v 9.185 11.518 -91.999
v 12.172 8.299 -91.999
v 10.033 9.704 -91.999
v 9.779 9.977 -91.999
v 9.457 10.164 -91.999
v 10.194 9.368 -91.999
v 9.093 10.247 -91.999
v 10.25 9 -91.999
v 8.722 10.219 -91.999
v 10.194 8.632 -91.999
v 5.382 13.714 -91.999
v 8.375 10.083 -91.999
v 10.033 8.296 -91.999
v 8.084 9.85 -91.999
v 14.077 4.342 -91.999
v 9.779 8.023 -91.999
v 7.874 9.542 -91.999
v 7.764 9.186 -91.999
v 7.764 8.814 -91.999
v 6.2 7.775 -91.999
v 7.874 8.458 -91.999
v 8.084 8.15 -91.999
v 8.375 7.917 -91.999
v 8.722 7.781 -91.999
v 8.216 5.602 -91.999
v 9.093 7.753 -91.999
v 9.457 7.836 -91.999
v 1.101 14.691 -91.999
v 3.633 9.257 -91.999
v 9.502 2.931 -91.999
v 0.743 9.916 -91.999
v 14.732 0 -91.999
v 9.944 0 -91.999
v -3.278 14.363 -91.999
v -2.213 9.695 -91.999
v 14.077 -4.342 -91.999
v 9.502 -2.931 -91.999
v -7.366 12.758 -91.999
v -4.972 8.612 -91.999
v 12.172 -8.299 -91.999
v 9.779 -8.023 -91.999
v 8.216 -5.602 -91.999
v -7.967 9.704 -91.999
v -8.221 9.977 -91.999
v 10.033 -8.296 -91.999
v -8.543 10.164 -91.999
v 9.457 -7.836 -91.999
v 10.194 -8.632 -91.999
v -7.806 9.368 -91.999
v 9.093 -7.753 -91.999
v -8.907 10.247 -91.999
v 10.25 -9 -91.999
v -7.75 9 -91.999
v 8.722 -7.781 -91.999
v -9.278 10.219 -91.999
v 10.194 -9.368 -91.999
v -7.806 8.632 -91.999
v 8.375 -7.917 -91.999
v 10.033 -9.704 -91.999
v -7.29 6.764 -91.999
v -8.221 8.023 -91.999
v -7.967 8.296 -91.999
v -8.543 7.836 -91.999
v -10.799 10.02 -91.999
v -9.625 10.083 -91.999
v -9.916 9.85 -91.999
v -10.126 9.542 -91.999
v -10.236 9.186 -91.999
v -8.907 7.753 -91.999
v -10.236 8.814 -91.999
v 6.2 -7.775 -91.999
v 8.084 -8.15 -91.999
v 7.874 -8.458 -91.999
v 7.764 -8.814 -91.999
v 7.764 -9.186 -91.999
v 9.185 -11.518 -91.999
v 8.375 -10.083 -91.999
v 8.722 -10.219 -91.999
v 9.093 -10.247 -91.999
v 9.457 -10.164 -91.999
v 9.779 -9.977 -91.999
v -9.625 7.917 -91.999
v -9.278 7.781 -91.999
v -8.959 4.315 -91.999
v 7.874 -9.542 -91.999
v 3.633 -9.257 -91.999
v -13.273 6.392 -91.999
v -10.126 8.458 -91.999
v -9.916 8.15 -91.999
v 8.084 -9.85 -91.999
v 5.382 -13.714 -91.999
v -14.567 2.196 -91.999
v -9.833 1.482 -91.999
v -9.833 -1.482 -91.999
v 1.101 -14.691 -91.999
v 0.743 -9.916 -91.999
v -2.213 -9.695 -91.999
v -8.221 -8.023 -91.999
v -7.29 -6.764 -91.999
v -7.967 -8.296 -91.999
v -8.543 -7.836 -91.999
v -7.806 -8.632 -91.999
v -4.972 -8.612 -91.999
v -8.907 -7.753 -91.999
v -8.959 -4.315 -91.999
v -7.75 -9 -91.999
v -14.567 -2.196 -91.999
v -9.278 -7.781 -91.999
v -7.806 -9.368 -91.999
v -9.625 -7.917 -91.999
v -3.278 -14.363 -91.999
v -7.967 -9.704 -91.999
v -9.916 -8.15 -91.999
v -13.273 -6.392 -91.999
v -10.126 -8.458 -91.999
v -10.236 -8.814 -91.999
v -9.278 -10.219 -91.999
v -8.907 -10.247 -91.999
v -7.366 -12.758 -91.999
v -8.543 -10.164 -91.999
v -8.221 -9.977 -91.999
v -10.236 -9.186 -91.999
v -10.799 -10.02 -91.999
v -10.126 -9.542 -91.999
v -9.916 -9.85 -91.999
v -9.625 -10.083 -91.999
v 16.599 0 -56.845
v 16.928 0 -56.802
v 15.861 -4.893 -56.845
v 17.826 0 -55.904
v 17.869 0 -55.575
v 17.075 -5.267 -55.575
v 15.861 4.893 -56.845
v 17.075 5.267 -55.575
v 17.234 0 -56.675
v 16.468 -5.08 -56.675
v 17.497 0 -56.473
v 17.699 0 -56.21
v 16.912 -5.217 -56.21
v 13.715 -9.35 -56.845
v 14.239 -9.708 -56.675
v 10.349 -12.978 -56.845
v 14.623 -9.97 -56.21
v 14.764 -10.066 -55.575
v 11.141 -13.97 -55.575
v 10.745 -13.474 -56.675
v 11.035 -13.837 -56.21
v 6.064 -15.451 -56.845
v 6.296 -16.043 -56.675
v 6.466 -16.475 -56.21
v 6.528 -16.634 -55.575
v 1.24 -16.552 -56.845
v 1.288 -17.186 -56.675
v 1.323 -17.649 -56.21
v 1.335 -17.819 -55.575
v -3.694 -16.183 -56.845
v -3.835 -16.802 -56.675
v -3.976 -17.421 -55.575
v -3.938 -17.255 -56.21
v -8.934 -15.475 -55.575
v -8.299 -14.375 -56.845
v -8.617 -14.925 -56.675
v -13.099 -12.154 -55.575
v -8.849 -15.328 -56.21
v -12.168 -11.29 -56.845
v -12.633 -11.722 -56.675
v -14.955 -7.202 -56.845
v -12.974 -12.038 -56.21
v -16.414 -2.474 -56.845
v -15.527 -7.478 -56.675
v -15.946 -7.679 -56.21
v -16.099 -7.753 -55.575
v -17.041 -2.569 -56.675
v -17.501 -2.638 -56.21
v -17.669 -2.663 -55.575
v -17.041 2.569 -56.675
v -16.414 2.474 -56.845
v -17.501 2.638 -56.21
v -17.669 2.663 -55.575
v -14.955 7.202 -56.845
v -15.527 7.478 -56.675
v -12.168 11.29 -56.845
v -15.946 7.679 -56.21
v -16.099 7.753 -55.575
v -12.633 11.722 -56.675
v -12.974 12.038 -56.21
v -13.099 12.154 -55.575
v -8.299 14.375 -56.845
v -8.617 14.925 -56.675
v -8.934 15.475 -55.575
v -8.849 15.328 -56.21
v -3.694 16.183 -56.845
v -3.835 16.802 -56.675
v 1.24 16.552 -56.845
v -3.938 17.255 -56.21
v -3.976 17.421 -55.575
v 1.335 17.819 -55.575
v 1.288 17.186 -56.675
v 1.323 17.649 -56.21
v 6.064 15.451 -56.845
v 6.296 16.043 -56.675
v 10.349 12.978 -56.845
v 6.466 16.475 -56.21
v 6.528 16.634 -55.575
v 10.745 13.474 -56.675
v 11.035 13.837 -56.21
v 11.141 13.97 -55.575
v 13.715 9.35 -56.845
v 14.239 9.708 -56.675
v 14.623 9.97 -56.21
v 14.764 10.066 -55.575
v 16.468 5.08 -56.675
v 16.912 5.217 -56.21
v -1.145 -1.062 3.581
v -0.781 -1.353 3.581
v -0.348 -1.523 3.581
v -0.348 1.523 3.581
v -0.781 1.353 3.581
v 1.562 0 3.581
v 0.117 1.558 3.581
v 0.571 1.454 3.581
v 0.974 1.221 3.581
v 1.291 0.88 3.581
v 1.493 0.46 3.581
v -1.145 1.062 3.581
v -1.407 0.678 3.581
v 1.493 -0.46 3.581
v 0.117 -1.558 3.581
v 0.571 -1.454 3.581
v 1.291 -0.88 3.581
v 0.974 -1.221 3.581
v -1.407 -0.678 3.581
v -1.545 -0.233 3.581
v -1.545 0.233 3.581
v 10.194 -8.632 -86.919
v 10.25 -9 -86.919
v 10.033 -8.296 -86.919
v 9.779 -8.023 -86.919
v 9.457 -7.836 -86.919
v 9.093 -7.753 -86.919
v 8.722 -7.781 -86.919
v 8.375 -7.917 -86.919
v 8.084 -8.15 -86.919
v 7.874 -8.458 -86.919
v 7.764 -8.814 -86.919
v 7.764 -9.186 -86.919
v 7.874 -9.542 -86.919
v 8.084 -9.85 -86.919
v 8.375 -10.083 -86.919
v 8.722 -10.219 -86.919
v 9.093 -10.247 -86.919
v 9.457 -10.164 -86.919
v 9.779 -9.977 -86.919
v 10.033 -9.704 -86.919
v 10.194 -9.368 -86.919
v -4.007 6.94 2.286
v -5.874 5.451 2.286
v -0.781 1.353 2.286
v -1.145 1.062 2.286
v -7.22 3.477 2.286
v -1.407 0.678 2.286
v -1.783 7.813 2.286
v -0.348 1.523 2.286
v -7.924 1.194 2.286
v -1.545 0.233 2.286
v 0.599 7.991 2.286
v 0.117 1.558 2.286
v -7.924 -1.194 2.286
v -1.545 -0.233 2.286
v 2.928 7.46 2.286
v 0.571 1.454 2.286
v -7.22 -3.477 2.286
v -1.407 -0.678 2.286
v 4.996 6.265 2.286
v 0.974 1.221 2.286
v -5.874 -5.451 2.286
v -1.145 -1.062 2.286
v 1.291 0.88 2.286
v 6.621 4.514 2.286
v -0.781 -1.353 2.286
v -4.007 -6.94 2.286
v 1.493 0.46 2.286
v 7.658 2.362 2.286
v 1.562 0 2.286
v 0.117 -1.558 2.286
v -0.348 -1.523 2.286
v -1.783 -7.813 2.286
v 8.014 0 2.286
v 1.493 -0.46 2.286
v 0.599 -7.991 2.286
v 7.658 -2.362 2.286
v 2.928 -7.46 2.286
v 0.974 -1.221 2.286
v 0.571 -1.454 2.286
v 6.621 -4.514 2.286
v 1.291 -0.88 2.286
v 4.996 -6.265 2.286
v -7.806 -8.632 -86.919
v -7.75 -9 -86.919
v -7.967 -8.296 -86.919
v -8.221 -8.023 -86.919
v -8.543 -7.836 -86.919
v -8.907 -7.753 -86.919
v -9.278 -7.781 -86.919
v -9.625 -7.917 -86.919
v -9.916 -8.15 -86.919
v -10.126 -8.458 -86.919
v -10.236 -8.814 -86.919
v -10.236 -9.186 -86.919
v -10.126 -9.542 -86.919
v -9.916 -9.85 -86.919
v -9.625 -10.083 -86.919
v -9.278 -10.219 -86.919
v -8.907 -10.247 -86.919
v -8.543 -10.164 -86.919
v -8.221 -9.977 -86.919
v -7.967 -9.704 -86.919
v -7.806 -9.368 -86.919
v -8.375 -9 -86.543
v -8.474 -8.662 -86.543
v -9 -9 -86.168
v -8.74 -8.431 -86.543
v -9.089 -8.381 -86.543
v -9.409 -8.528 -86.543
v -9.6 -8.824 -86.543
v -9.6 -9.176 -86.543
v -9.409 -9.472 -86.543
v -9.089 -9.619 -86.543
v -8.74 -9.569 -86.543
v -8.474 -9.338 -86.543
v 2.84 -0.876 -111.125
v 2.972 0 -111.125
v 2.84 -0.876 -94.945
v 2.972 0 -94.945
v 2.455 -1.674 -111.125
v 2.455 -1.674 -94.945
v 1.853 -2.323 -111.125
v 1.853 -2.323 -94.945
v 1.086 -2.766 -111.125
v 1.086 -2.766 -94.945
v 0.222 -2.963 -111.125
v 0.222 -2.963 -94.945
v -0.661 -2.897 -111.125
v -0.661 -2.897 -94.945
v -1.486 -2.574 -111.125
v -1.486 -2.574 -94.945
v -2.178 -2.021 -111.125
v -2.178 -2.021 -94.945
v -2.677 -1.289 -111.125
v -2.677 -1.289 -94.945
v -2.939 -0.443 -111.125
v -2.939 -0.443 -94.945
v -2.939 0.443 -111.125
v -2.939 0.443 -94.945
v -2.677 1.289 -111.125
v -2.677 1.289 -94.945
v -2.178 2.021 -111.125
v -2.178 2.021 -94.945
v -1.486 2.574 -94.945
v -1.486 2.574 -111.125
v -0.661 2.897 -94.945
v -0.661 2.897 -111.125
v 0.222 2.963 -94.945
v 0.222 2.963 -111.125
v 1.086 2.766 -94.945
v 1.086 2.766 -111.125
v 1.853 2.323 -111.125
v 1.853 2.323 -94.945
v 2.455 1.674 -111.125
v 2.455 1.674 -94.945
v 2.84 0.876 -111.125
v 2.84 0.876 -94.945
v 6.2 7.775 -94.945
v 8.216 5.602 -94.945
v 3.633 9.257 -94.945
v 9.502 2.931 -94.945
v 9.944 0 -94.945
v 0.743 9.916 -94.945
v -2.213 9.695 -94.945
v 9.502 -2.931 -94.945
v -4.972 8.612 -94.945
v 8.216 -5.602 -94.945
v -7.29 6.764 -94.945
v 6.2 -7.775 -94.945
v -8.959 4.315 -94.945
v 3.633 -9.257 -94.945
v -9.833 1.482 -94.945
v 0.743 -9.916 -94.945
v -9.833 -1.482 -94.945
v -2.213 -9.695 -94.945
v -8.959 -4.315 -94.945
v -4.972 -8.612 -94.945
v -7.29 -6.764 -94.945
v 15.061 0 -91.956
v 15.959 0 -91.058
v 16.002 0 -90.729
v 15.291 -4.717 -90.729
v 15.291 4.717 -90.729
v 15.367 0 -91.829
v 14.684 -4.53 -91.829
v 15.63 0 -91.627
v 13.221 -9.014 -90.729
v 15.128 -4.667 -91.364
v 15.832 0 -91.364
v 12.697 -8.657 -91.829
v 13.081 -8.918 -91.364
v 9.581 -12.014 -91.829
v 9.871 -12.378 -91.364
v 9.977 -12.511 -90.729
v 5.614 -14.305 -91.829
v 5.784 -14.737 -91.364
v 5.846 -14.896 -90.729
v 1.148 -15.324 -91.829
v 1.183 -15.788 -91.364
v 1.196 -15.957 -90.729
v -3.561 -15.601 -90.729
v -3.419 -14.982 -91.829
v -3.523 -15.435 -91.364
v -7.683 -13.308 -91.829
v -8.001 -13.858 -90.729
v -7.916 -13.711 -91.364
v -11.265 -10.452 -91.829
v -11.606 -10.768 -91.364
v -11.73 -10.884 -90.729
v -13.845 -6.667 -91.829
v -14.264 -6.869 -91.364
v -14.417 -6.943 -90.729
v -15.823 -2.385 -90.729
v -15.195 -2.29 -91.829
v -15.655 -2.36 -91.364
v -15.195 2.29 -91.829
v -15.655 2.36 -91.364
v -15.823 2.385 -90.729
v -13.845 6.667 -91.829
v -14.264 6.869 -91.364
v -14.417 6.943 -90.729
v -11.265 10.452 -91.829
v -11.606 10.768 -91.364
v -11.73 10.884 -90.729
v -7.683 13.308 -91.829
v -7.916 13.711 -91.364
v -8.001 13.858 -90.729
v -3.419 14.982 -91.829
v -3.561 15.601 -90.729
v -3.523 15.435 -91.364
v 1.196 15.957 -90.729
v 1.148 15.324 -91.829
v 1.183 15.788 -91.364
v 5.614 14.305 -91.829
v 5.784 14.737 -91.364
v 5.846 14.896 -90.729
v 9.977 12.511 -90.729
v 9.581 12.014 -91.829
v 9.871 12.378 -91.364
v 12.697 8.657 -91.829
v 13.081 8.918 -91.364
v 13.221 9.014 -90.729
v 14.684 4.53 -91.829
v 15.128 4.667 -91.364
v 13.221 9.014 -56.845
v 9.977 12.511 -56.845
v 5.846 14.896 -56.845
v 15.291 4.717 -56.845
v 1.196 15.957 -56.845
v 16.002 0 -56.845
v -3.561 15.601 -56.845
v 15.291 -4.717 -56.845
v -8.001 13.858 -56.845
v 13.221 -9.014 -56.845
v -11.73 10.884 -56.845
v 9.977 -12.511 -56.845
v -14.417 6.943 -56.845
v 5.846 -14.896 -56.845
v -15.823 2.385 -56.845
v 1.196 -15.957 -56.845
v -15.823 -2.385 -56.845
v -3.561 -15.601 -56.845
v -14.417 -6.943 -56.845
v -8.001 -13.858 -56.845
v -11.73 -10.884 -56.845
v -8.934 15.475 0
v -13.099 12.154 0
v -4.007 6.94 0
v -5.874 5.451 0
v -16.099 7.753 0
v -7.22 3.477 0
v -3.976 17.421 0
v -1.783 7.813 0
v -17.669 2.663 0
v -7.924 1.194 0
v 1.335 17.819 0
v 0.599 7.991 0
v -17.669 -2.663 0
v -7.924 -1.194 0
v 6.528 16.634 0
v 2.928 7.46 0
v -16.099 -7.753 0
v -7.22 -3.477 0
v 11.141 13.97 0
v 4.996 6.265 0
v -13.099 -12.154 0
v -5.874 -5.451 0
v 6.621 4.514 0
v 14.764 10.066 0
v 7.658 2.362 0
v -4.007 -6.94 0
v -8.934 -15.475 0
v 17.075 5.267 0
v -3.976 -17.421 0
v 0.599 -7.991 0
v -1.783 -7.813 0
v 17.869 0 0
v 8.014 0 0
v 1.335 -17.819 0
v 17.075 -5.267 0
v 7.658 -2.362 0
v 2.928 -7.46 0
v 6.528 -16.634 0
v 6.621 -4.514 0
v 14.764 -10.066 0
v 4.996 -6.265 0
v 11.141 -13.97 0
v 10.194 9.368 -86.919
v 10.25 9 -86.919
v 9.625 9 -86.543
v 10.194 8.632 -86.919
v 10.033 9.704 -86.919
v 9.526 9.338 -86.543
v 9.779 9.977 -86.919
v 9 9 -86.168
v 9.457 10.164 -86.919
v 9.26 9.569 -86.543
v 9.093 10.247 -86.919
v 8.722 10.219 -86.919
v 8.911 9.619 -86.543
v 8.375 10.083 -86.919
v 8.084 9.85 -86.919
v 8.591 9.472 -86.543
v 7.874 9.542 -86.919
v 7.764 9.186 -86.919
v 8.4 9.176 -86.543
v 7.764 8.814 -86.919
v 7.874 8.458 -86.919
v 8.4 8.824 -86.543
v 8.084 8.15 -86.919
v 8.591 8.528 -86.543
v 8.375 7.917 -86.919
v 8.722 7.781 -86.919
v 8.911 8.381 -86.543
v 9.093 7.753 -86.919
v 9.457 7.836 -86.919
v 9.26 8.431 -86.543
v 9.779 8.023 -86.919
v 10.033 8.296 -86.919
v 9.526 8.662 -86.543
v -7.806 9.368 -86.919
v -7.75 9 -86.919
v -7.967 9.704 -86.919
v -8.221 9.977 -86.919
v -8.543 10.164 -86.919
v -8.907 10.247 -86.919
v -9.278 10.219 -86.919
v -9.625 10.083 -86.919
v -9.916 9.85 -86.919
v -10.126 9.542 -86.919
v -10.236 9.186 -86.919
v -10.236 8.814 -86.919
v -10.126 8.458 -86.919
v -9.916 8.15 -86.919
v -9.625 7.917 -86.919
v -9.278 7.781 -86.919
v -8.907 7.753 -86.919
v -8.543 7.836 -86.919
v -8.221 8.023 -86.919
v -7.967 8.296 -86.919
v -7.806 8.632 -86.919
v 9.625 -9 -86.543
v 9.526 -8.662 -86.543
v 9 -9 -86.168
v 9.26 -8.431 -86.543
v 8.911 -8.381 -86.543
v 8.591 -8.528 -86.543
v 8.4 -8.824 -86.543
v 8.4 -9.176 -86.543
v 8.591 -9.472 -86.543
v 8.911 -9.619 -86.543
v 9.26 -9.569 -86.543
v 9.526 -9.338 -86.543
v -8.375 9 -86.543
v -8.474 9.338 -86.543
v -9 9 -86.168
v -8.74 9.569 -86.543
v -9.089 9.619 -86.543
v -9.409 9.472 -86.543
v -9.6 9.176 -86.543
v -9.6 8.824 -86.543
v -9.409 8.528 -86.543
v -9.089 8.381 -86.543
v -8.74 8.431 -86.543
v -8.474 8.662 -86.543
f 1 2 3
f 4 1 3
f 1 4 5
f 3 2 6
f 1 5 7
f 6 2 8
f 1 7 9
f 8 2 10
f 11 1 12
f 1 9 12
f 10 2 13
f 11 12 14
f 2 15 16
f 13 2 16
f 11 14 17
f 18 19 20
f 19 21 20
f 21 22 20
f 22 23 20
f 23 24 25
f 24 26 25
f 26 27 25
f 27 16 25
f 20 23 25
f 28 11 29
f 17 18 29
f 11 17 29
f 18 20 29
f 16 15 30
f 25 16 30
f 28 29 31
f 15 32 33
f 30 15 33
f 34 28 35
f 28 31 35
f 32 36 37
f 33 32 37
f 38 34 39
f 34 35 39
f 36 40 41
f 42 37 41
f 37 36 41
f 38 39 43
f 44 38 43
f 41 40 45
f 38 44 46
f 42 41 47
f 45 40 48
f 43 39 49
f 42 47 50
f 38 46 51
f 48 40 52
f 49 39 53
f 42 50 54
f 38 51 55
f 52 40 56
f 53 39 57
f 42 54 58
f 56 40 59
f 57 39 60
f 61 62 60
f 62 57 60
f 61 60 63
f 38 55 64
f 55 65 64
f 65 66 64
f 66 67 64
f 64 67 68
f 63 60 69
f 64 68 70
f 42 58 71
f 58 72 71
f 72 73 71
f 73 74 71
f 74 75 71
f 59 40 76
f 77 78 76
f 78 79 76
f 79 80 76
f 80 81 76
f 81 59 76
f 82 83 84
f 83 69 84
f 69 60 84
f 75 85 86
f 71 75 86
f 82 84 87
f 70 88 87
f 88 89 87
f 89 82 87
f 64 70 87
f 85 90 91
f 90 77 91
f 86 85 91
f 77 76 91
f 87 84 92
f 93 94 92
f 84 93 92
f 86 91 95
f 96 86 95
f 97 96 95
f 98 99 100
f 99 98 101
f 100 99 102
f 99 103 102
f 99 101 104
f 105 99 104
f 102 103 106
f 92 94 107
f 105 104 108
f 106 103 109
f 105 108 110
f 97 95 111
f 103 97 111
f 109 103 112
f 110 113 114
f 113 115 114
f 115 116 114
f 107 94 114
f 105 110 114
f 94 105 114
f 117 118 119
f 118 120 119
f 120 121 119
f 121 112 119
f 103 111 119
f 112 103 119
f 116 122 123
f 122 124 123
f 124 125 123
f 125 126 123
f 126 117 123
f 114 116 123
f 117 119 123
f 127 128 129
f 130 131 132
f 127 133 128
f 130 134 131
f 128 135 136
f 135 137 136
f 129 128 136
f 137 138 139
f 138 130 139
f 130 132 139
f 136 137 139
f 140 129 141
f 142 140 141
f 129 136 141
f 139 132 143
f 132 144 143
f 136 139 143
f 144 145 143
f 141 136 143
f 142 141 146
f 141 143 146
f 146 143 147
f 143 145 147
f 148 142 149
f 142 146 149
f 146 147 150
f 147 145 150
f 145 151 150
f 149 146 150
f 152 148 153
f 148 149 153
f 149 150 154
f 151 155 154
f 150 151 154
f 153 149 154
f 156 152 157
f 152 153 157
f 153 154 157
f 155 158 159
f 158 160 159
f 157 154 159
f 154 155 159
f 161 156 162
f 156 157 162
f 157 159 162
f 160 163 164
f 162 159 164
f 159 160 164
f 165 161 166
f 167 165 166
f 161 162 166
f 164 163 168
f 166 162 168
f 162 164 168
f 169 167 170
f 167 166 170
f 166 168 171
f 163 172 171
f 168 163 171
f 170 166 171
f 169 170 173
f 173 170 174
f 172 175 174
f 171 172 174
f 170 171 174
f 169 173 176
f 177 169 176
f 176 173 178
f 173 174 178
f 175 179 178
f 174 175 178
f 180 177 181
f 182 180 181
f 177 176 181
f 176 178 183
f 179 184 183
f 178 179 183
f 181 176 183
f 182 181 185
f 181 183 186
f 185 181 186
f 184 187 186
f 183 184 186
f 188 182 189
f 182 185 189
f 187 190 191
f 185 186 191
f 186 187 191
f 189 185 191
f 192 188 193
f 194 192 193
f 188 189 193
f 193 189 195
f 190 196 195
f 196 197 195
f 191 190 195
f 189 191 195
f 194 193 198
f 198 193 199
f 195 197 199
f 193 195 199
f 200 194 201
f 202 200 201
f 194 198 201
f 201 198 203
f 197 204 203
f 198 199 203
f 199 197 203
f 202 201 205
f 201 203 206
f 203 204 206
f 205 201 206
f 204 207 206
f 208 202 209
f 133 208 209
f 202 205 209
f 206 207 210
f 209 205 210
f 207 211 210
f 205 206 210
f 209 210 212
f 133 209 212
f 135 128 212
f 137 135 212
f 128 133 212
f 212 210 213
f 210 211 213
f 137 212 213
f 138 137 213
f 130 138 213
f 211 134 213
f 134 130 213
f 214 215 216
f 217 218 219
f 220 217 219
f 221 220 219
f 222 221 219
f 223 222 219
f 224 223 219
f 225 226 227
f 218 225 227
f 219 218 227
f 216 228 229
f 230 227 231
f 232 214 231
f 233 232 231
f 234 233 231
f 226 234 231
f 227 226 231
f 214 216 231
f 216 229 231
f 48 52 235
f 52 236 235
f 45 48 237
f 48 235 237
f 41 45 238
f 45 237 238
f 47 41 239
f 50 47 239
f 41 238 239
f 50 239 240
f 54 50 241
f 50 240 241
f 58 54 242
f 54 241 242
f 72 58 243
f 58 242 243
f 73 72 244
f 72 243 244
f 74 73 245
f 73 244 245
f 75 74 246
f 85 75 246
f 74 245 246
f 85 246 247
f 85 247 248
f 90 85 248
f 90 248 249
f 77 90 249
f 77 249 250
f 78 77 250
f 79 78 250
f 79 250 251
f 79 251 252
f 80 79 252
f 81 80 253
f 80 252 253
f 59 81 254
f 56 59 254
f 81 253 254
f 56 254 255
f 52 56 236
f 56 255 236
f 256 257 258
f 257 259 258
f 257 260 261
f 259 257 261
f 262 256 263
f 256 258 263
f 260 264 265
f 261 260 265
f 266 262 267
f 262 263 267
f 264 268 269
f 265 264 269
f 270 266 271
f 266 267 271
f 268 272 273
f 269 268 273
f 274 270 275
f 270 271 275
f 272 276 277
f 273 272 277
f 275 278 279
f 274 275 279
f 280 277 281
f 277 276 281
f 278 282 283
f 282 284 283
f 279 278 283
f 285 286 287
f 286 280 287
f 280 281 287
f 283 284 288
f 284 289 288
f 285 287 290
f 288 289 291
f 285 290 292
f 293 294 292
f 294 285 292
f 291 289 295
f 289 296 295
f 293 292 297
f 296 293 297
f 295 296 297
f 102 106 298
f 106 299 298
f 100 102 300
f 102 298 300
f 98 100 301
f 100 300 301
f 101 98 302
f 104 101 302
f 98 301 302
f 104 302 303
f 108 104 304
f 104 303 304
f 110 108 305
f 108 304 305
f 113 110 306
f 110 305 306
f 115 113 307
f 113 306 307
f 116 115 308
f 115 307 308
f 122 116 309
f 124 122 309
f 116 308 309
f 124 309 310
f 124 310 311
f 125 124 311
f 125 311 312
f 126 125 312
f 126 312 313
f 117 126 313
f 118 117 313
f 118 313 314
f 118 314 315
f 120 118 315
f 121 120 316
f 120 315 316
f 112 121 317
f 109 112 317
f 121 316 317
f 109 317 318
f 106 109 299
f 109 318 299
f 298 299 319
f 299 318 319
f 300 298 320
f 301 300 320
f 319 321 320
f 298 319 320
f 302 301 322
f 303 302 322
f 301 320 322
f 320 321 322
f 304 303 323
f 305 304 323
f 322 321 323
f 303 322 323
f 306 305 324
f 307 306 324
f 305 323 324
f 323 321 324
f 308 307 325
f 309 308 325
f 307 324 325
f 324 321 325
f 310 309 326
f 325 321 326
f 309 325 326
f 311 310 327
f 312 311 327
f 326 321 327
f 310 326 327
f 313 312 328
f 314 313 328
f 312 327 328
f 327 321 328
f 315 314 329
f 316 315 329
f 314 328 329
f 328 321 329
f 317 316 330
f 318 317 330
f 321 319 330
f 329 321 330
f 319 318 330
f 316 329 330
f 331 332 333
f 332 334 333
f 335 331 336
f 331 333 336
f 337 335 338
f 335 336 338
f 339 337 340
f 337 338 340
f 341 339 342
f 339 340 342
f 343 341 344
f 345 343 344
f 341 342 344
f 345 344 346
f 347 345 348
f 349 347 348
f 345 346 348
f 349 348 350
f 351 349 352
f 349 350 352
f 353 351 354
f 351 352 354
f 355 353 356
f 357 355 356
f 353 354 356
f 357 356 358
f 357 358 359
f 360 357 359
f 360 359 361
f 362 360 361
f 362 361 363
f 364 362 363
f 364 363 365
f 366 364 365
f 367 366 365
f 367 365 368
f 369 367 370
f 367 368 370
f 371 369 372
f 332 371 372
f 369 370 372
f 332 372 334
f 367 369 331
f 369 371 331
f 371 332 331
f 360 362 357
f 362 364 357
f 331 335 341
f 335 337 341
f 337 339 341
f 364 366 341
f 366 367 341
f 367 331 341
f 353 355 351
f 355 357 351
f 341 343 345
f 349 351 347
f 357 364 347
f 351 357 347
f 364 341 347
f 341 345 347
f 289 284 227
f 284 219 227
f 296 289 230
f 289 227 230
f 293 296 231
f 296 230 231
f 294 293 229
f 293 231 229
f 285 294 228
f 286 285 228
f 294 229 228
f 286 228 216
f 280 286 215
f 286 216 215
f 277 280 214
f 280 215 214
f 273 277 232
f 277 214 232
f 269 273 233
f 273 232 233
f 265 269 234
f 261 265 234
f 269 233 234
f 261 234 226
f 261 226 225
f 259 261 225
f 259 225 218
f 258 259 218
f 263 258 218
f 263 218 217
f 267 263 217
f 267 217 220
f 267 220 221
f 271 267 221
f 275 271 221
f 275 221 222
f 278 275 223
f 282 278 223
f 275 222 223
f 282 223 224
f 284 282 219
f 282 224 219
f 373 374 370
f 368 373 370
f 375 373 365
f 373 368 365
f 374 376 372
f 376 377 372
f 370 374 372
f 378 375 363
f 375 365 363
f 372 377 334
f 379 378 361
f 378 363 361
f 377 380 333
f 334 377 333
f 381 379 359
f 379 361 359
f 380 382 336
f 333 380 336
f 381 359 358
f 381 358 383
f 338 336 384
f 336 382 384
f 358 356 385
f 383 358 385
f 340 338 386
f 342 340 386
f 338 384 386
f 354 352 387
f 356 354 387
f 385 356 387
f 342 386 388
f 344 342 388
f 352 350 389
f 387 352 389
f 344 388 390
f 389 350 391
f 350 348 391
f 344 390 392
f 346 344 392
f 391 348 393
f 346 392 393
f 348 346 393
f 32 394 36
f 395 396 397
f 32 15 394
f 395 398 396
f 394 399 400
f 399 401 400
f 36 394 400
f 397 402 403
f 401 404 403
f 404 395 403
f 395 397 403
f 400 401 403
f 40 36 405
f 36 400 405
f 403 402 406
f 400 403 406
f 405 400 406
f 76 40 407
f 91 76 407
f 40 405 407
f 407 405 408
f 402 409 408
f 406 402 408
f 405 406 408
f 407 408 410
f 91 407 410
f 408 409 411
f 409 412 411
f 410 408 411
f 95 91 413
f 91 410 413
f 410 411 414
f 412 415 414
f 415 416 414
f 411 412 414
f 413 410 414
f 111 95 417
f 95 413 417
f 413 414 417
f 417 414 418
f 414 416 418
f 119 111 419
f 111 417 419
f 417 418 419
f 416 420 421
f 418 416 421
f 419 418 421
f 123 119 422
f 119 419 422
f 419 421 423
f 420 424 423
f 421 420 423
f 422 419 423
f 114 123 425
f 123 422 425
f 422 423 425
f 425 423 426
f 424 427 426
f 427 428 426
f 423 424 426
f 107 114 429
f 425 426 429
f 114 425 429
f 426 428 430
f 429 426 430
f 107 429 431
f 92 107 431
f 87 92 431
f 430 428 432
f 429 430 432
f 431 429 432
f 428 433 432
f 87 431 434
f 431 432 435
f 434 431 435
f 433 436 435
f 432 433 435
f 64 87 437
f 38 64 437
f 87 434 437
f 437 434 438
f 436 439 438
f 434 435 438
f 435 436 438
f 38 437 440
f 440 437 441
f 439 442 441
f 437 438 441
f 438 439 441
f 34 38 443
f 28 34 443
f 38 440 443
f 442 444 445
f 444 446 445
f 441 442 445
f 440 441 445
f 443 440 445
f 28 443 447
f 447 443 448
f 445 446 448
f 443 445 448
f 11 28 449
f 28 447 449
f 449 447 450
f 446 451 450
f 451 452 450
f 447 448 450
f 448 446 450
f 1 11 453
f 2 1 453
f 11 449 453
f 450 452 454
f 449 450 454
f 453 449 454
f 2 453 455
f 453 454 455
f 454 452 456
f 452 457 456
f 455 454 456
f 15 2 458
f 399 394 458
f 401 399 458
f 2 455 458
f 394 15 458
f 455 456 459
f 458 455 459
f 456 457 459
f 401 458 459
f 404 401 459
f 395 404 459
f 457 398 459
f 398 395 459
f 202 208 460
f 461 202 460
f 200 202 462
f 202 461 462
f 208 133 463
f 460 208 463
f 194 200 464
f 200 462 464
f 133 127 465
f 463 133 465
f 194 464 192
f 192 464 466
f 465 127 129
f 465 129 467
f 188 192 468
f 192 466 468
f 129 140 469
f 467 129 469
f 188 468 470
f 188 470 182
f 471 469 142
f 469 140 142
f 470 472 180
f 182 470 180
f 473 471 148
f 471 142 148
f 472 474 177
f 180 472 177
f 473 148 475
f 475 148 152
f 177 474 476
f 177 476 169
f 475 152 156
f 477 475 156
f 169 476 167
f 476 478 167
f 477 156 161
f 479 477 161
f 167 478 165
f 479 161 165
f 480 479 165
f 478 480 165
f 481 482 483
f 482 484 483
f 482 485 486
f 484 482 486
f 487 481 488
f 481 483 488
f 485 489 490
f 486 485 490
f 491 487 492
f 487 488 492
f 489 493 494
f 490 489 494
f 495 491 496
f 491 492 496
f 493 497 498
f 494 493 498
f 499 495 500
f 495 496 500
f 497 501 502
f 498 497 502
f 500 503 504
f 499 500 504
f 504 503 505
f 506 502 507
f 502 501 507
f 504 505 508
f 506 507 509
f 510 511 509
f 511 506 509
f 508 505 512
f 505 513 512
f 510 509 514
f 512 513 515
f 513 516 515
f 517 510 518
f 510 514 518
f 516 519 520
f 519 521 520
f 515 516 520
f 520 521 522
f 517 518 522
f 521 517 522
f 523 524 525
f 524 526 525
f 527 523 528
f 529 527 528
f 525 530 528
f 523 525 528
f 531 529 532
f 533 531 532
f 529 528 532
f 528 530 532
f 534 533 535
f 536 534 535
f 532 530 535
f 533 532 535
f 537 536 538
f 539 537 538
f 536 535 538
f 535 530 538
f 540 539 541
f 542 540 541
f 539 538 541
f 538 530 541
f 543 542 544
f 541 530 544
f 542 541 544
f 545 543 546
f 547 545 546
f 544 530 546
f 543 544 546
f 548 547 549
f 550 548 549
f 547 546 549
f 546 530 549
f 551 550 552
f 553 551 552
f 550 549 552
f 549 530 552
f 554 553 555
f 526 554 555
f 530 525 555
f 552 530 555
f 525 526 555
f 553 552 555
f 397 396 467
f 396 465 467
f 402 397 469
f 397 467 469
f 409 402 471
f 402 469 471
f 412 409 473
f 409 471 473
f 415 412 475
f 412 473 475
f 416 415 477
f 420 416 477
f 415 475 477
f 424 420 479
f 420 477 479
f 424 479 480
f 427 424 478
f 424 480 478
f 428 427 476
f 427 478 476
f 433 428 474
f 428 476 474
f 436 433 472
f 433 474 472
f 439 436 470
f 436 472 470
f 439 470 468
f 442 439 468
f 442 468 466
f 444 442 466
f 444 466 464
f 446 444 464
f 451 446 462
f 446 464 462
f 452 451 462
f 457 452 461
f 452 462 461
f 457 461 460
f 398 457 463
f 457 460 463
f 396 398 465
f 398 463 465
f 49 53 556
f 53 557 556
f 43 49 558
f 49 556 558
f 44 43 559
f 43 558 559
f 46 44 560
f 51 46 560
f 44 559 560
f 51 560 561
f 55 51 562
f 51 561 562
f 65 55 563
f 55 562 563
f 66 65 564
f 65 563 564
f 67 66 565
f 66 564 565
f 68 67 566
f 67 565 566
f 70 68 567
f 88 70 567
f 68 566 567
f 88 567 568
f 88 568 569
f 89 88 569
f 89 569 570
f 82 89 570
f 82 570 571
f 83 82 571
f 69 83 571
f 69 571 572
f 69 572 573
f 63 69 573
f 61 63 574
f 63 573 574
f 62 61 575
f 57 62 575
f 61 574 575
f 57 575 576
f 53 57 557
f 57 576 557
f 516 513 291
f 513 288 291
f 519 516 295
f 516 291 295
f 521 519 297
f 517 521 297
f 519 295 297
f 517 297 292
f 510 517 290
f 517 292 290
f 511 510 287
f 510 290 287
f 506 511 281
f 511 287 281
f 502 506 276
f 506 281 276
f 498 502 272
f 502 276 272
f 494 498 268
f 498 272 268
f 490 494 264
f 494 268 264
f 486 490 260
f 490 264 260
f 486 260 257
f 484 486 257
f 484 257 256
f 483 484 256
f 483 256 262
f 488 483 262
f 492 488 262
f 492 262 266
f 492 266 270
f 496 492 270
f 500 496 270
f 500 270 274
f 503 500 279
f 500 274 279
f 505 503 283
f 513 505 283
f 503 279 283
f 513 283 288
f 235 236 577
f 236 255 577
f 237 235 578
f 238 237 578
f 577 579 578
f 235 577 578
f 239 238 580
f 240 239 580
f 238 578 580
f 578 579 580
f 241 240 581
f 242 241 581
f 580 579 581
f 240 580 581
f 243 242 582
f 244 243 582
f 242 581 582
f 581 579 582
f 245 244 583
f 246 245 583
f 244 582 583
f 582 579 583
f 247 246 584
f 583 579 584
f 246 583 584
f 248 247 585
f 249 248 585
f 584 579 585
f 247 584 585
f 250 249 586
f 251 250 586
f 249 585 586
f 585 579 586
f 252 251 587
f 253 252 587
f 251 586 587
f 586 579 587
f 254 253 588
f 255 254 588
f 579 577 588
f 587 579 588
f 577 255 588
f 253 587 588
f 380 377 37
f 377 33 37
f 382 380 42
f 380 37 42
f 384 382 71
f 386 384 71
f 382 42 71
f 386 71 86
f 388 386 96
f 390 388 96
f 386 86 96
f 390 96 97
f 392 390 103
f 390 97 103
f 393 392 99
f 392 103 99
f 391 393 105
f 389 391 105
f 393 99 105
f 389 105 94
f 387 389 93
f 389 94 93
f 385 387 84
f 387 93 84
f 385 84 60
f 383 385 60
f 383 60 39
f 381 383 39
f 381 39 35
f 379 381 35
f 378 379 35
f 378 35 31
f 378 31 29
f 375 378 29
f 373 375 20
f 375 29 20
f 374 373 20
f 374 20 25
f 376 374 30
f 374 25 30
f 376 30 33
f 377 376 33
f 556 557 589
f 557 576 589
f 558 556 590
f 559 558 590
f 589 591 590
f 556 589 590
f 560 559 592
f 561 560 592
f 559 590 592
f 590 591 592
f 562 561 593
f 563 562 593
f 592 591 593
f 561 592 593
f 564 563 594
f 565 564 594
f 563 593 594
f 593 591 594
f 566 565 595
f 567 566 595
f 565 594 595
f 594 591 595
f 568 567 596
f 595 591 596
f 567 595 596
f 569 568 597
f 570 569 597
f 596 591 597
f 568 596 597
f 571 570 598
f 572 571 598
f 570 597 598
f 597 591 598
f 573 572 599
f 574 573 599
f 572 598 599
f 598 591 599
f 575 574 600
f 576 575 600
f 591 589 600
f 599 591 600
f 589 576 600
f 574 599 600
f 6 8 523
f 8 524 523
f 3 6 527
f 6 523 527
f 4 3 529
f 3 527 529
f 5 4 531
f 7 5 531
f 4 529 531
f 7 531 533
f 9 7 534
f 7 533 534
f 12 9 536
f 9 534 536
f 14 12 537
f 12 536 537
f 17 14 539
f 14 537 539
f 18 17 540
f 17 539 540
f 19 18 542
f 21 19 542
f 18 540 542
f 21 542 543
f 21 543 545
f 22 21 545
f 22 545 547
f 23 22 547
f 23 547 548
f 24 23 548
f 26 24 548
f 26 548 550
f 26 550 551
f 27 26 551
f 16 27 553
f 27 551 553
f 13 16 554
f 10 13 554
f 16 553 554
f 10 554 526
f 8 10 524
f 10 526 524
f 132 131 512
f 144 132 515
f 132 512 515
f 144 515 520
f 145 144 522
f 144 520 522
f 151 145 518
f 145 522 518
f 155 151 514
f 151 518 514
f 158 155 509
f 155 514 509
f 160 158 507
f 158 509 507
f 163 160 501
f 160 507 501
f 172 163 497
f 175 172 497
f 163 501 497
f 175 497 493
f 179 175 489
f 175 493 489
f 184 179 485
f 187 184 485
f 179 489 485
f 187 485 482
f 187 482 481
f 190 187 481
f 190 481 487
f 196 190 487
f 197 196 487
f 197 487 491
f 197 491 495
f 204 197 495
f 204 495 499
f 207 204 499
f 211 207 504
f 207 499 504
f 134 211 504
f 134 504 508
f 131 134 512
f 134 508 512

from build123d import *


# Read off the part's stored shape, not the designer's step: M3x0.5 Tapped Hole1
with BuildPart() as part:
    # Sketch1 → Revolve1 (revolve)
    with BuildSketch(Plane(origin=(0, 0, 0), x_dir=(0, 0, -1), z_dir=(1, 0, 0)), mode=Mode.PRIVATE) as revolve1_sk:
        with BuildLine():
            Line((111.125, 0), (111.125, 2.9718))
            Line((111.125, 2.9718), (94.9452, 2.9718))
            Line((94.9452, 2.9718), (94.9452, 9.9441))
            Line((94.9452, 9.9441), (91.9988, 9.9441))
            Line((91.9988, 9.9441), (91.9988, 14.732))
            ThreePointArc((91.9988, 14.732), (91.626825612, 15.630025612), (90.7288, 16.002))
            Line((90.7288, 16.002), (56.8452, 16.002))
            Line((56.8452, 16.002), (56.8452, 16.5989))
            ThreePointArc((56.8452, 16.5989), (56.473225612, 17.496925612), (55.5752, 17.8689))
            Line((55.5752, 17.8689), (0, 17.8689))
            Line((0, 17.8689), (0, 8.0137))
            Line((0, 8.0137), (-2.286, 8.0137))
            Line((-2.286, 8.0137), (-2.286, 1.5621))
            Line((-2.286, 1.5621), (-3.5814, 1.5621))
            Line((-3.5814, 1.5621), (-3.5814, 0))
            Line((-3.5814, 0), (111.125, 0))
        make_face()
    revolve(revolve1_sk.sketch.rotate(Axis((0, 0, 3.5814), (0, 0, -1)), 90), axis=Axis((0, 0, 3.5814), (0, 0, -1)))

    # M3x0.5 Tapped Hole1 outline → M3x0.5 Tapped Hole1 (revolve, cut)
    with BuildSketch(Plane(origin=(-9, -9, 0), x_dir=(1, 0, 0), z_dir=(0, -1, 0))):
        Polygon((1.25, -86.9188), (0, -86.167724226), (0, -91.9988), (1.25, -91.9988), align=None)
    revolve(axis=Axis((-9, -9, 0), (0, 0, 1)), mode=Mode.SUBTRACT)

    # M3x0.5 Tapped Hole1 2 outline → M3x0.5 Tapped Hole1 2 (revolve, cut)
    with BuildSketch(Plane(origin=(9, 9, 0), x_dir=(1, 0, 0), z_dir=(0, -1, 0))):
        Polygon((1.25, -86.9188), (0, -86.167724226), (0, -91.9988), (1.25, -91.9988), align=None)
    revolve(axis=Axis((9, 9, 0), (0, 0, 1)), mode=Mode.SUBTRACT)

    # M3x0.5 Tapped Hole1 3 outline → M3x0.5 Tapped Hole1 3 (revolve, cut)
    with BuildSketch(Plane(origin=(9, -9, 0), x_dir=(1, 0, 0), z_dir=(0, -1, 0))):
        Polygon((1.25, -86.9188), (0, -86.167724226), (0, -91.9988), (1.25, -91.9988), align=None)
    revolve(axis=Axis((9, -9, 0), (0, 0, 1)), mode=Mode.SUBTRACT)

    # M3x0.5 Tapped Hole1 4 outline → M3x0.5 Tapped Hole1 4 (revolve, cut)
    with BuildSketch(Plane(origin=(-9, 9, 0), x_dir=(1, 0, 0), z_dir=(0, -1, 0))):
        Polygon((1.25, -86.9188), (0, -86.167724226), (0, -91.9988), (1.25, -91.9988), align=None)
    revolve(axis=Axis((-9, 9, 0), (0, 0, 1)), mode=Mode.SUBTRACT)


solid = part.part
